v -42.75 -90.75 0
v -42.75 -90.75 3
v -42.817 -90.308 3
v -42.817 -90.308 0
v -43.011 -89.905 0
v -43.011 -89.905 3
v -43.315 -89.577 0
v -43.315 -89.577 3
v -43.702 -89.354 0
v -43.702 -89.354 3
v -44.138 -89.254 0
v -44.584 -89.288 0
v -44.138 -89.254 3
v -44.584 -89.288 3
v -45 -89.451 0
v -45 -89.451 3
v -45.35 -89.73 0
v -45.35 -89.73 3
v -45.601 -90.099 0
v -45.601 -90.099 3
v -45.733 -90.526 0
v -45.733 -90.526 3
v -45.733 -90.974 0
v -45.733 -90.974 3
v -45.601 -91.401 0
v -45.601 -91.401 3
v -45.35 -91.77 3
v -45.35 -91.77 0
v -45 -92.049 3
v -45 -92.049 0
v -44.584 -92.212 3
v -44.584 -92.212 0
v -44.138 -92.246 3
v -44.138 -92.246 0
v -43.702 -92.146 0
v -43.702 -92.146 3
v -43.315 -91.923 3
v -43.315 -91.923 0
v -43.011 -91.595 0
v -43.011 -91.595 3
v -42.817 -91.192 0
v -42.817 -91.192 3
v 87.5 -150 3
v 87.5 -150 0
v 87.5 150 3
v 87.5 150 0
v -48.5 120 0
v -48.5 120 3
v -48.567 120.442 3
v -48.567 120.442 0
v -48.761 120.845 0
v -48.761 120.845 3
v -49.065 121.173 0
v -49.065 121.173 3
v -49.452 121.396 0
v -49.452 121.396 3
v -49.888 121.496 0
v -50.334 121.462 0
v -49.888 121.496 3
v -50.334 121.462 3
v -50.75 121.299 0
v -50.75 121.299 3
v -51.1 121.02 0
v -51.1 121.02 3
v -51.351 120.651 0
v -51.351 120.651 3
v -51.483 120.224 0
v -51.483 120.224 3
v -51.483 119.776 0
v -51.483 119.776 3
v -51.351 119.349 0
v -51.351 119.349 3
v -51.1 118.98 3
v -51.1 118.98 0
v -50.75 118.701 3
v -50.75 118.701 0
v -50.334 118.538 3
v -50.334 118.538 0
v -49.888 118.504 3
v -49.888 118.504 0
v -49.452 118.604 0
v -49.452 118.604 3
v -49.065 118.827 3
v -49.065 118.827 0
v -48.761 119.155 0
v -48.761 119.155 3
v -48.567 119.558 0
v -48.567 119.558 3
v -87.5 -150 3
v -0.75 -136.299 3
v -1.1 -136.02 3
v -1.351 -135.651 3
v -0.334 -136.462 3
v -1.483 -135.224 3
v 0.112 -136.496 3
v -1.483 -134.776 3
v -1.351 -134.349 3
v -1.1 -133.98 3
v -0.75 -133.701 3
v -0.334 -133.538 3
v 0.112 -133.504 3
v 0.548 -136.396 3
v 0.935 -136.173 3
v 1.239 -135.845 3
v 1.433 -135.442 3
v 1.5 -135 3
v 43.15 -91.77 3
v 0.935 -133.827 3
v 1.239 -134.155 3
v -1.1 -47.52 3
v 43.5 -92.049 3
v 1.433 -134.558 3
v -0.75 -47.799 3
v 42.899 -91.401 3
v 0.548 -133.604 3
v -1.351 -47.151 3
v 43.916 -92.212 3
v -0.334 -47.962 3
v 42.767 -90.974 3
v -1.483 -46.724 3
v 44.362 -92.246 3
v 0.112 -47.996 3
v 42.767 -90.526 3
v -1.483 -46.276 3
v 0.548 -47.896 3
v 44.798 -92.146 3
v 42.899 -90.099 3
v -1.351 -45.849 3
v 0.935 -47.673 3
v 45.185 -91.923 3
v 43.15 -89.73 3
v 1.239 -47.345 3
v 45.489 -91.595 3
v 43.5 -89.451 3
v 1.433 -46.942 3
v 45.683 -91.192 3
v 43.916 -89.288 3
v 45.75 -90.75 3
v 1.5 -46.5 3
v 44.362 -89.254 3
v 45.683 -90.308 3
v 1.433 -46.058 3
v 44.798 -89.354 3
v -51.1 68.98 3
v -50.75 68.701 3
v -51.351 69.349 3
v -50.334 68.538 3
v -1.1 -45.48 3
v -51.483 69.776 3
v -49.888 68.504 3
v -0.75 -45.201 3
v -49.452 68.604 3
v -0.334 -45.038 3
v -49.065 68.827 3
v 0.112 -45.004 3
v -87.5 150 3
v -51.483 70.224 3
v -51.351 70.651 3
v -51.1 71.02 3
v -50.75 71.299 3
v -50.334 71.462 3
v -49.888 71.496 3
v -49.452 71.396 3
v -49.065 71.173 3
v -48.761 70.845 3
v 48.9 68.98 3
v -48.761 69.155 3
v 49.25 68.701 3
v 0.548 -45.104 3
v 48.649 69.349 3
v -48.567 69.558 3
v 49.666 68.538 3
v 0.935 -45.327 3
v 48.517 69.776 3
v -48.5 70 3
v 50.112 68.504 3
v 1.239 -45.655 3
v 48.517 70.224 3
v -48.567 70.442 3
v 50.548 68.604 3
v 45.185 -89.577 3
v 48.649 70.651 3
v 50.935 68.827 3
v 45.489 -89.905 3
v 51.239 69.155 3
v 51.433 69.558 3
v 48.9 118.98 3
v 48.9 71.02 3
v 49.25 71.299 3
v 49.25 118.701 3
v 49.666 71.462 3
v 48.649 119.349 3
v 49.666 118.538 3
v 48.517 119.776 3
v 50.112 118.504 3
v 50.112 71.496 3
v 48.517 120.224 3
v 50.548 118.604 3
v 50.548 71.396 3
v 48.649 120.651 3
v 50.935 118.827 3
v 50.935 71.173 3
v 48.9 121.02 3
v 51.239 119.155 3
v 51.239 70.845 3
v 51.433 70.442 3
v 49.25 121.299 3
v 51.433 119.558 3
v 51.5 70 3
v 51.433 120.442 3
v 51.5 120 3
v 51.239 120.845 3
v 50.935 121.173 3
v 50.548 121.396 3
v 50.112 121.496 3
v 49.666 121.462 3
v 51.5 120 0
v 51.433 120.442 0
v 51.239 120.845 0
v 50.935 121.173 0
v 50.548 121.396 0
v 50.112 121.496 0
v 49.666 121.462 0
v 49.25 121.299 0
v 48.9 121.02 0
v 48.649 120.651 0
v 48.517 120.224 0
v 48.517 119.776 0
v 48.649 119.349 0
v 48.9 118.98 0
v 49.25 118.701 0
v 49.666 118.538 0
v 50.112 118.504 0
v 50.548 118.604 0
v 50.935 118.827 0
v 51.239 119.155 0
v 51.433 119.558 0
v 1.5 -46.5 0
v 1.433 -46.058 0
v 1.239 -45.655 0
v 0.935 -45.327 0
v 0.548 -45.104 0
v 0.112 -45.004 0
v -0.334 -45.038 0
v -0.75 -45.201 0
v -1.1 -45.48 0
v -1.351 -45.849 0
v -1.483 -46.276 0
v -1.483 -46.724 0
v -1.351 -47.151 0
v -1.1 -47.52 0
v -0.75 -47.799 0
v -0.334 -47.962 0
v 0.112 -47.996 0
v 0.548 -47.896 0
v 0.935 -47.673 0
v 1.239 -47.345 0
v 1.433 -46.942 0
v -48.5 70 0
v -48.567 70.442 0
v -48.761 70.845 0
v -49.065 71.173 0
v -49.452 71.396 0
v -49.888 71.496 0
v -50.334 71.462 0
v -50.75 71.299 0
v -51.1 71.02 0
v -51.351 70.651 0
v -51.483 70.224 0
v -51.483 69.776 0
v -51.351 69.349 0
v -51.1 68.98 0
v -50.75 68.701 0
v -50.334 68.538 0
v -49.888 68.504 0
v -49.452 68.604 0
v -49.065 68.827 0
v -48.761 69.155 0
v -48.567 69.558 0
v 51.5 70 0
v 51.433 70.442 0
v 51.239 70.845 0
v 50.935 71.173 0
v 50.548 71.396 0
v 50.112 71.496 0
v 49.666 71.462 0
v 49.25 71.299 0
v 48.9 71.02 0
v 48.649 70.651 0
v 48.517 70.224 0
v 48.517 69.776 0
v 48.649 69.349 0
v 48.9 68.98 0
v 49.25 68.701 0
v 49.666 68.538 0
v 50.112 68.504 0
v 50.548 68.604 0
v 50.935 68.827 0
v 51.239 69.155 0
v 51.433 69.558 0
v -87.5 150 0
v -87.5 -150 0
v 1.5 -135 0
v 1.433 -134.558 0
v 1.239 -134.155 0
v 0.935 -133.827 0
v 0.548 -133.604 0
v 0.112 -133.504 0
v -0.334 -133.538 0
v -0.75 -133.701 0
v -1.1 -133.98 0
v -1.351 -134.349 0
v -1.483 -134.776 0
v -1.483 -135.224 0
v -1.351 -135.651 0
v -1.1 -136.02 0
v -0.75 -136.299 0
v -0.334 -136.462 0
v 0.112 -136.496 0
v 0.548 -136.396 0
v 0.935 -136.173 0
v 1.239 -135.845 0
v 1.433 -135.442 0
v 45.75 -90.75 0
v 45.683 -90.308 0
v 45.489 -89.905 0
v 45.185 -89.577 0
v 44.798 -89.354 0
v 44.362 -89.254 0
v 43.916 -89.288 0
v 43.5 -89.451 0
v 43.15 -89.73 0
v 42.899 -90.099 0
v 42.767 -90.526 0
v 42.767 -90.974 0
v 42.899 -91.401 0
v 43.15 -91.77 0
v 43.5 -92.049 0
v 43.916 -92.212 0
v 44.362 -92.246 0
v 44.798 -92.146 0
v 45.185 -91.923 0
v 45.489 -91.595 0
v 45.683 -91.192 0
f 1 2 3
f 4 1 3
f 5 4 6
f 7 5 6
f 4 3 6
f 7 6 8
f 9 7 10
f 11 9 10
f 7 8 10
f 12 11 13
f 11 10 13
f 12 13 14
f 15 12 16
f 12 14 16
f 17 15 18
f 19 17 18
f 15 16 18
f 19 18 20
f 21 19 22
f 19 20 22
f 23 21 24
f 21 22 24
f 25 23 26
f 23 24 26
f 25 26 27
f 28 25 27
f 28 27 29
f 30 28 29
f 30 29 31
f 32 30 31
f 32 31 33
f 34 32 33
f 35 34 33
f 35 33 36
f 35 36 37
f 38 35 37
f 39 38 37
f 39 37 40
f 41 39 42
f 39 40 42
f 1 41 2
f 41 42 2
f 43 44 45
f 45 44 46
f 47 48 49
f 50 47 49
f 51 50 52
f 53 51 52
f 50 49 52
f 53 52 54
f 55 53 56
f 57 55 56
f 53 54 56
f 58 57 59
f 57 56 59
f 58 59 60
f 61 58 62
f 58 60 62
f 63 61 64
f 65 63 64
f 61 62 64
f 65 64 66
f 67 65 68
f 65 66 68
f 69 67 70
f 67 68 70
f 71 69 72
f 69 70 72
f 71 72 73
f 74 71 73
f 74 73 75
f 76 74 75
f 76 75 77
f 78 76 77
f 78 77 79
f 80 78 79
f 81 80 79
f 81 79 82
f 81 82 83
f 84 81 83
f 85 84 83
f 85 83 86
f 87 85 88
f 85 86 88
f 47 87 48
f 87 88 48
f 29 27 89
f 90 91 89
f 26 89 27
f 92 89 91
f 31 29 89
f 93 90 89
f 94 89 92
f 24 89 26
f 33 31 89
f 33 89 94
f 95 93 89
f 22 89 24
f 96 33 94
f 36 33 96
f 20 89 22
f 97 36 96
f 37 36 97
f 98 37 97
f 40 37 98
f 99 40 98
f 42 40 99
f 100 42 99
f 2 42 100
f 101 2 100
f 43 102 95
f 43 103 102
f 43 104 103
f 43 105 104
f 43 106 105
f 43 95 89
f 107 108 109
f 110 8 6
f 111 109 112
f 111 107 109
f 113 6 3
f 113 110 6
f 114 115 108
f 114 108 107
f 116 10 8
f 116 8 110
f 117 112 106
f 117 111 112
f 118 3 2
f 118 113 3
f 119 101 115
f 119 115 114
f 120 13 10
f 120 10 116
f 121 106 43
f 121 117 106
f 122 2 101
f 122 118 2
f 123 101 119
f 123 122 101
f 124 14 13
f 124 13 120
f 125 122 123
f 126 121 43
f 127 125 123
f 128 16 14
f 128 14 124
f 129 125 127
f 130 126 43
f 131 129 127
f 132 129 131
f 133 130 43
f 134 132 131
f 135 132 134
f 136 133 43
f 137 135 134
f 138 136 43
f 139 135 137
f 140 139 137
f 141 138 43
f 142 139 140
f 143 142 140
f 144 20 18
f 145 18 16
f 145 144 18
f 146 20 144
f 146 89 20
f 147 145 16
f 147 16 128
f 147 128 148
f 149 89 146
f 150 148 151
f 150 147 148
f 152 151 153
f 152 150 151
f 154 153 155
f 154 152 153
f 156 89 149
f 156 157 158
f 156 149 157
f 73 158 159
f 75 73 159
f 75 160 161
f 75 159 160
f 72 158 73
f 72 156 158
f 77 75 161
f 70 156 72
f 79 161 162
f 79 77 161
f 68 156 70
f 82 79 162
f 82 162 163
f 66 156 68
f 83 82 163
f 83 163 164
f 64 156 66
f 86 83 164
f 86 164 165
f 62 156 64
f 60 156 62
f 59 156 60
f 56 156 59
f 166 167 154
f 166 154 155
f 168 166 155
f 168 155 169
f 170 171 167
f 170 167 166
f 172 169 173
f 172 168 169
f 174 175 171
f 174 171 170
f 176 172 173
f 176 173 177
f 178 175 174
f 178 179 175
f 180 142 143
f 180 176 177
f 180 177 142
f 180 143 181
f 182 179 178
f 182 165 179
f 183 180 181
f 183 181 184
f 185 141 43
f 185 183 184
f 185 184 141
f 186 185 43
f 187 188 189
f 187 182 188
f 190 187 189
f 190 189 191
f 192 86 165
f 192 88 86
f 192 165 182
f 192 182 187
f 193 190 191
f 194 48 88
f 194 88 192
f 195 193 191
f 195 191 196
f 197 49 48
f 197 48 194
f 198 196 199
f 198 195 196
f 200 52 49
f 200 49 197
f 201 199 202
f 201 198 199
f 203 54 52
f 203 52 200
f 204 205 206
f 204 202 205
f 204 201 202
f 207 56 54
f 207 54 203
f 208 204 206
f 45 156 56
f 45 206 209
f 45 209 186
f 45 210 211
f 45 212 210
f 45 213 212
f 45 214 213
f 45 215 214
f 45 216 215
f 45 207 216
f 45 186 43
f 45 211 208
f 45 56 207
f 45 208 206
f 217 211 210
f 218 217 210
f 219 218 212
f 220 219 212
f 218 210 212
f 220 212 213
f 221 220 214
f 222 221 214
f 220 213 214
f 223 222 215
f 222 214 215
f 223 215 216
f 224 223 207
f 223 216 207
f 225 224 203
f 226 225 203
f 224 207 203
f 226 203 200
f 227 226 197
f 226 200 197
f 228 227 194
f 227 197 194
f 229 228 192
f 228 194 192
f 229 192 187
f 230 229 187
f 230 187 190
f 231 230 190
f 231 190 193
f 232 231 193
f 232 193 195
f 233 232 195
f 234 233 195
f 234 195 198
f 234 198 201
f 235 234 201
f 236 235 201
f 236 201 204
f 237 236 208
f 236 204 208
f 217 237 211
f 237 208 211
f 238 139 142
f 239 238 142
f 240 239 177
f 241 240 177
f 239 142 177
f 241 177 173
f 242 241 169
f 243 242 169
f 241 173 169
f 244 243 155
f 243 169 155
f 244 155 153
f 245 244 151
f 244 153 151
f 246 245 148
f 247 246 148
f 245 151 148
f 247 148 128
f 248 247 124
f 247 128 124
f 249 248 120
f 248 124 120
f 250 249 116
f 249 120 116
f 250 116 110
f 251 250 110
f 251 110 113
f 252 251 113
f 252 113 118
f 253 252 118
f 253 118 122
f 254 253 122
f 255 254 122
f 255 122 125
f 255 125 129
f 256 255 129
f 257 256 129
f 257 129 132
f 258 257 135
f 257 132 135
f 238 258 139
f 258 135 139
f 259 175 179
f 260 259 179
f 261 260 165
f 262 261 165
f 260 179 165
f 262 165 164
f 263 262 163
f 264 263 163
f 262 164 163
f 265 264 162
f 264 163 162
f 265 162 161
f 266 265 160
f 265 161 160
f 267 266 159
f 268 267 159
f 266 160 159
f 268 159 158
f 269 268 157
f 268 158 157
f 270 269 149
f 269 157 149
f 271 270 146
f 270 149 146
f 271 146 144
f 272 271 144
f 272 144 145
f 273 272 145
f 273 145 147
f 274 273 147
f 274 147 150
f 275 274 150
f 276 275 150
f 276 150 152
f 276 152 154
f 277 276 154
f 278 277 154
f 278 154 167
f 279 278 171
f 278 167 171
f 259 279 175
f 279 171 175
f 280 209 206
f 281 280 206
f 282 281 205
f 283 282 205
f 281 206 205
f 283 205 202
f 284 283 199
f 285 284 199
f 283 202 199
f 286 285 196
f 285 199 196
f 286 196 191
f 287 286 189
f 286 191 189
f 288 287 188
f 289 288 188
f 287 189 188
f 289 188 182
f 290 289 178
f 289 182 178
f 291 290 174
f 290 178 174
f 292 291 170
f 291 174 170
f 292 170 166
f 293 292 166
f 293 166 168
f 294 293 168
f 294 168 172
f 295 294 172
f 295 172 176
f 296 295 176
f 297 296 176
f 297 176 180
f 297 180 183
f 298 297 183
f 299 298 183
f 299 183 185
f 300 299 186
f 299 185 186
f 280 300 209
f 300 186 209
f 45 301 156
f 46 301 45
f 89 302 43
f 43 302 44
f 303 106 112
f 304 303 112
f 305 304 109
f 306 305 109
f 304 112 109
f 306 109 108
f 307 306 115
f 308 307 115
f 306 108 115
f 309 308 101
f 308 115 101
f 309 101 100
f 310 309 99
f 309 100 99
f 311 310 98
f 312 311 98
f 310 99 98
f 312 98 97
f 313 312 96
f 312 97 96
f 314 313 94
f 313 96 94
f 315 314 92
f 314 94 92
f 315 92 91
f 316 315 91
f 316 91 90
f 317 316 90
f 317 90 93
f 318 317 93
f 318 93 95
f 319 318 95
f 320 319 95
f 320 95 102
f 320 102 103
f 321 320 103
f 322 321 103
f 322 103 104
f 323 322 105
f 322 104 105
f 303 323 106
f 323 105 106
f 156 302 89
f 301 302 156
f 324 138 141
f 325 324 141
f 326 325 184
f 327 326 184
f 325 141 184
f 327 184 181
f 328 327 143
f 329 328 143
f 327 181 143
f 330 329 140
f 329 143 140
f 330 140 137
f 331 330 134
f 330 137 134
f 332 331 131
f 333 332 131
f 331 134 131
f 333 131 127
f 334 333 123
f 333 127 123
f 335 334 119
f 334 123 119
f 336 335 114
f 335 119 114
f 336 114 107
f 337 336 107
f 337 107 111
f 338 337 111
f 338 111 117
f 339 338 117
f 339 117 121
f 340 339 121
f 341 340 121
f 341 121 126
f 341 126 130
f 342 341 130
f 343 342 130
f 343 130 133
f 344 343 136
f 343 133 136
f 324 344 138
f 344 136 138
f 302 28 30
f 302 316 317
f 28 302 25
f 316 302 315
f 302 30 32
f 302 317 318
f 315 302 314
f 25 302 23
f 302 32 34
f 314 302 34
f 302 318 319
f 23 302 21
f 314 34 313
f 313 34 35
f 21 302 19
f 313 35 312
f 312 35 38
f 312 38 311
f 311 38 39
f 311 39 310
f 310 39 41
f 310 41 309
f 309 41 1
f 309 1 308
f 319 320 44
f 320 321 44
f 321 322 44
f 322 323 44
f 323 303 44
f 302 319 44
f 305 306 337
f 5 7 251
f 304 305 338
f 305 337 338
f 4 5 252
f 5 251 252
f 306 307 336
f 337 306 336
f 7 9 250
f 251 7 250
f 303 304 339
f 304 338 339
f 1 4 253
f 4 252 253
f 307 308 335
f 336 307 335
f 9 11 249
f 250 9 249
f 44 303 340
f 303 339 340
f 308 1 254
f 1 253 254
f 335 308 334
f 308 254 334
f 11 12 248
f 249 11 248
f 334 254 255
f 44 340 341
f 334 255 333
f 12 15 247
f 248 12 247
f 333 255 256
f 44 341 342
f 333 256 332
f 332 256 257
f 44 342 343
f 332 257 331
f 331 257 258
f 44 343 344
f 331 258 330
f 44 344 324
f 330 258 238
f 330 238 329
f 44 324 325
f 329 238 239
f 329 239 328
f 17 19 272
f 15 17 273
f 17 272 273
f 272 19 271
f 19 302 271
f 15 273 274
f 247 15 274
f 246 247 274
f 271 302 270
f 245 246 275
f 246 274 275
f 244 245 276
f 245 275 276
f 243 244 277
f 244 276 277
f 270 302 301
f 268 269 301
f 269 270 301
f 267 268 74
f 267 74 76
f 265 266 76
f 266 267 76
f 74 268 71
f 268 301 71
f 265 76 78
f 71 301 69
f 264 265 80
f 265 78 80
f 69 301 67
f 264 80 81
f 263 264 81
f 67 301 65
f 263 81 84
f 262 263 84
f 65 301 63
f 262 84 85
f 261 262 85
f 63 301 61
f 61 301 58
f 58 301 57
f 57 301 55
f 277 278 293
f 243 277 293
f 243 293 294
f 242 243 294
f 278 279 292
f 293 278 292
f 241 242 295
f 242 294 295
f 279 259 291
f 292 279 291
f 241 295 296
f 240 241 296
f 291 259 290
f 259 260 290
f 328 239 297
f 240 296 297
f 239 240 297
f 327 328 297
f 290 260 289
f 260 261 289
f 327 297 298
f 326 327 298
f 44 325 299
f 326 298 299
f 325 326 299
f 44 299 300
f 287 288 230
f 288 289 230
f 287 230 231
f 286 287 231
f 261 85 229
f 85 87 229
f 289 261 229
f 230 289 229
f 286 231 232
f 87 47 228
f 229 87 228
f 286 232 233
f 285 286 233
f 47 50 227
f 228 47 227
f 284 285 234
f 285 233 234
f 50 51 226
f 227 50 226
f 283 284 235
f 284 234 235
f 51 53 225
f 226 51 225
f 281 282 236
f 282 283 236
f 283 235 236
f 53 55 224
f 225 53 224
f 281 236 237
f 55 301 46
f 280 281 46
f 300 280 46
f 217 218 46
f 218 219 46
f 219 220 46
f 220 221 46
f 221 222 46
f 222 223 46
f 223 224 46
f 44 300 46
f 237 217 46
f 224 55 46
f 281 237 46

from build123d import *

# Parameters (mm, degrees)
SKETCH_1_W          = 175
SKETCH_1_H          = 300
EXTRUDE_1_DEPTH     = 3
SKETCH_2_R          = 1.5
CUT_EXTRUDE_1_DEPTH = 3
SKETCH_3_R          = 1.5
CUT_EXTRUDE_2_DEPTH = 3


with BuildPart() as part:
    # 草图1 → 凸台-拉伸1 (new body)
    with BuildSketch(Plane.XY):
        Rectangle(SKETCH_1_W, SKETCH_1_H)
    extrude(amount=EXTRUDE_1_DEPTH)

    # 草图2 → 切除-拉伸1 (cut)
    with BuildSketch(Plane.XY.offset(3)):
        with Locations((0, -135)):
            Circle(SKETCH_2_R)
        with Locations((-44.25, -90.75)):
            Circle(SKETCH_2_R)
        with Locations((0, -46.5)):
            Circle(SKETCH_2_R)
        with Locations((44.25, -90.75)):
            Circle(SKETCH_2_R)
    extrude(amount=-CUT_EXTRUDE_1_DEPTH, mode=Mode.SUBTRACT)

    # 草图3 → 切除-拉伸2 (cut)
    with BuildSketch(Plane.XY.offset(3)):
        with Locations((50, 70)):
            Circle(SKETCH_3_R)
        with Locations((50, 120)):
            Circle(SKETCH_3_R)
        with Locations((-50, 120)):
            Circle(SKETCH_3_R)
        with Locations((-50, 70)):
            Circle(SKETCH_3_R)
    extrude(amount=-CUT_EXTRUDE_2_DEPTH, mode=Mode.SUBTRACT)


solid = part.part
